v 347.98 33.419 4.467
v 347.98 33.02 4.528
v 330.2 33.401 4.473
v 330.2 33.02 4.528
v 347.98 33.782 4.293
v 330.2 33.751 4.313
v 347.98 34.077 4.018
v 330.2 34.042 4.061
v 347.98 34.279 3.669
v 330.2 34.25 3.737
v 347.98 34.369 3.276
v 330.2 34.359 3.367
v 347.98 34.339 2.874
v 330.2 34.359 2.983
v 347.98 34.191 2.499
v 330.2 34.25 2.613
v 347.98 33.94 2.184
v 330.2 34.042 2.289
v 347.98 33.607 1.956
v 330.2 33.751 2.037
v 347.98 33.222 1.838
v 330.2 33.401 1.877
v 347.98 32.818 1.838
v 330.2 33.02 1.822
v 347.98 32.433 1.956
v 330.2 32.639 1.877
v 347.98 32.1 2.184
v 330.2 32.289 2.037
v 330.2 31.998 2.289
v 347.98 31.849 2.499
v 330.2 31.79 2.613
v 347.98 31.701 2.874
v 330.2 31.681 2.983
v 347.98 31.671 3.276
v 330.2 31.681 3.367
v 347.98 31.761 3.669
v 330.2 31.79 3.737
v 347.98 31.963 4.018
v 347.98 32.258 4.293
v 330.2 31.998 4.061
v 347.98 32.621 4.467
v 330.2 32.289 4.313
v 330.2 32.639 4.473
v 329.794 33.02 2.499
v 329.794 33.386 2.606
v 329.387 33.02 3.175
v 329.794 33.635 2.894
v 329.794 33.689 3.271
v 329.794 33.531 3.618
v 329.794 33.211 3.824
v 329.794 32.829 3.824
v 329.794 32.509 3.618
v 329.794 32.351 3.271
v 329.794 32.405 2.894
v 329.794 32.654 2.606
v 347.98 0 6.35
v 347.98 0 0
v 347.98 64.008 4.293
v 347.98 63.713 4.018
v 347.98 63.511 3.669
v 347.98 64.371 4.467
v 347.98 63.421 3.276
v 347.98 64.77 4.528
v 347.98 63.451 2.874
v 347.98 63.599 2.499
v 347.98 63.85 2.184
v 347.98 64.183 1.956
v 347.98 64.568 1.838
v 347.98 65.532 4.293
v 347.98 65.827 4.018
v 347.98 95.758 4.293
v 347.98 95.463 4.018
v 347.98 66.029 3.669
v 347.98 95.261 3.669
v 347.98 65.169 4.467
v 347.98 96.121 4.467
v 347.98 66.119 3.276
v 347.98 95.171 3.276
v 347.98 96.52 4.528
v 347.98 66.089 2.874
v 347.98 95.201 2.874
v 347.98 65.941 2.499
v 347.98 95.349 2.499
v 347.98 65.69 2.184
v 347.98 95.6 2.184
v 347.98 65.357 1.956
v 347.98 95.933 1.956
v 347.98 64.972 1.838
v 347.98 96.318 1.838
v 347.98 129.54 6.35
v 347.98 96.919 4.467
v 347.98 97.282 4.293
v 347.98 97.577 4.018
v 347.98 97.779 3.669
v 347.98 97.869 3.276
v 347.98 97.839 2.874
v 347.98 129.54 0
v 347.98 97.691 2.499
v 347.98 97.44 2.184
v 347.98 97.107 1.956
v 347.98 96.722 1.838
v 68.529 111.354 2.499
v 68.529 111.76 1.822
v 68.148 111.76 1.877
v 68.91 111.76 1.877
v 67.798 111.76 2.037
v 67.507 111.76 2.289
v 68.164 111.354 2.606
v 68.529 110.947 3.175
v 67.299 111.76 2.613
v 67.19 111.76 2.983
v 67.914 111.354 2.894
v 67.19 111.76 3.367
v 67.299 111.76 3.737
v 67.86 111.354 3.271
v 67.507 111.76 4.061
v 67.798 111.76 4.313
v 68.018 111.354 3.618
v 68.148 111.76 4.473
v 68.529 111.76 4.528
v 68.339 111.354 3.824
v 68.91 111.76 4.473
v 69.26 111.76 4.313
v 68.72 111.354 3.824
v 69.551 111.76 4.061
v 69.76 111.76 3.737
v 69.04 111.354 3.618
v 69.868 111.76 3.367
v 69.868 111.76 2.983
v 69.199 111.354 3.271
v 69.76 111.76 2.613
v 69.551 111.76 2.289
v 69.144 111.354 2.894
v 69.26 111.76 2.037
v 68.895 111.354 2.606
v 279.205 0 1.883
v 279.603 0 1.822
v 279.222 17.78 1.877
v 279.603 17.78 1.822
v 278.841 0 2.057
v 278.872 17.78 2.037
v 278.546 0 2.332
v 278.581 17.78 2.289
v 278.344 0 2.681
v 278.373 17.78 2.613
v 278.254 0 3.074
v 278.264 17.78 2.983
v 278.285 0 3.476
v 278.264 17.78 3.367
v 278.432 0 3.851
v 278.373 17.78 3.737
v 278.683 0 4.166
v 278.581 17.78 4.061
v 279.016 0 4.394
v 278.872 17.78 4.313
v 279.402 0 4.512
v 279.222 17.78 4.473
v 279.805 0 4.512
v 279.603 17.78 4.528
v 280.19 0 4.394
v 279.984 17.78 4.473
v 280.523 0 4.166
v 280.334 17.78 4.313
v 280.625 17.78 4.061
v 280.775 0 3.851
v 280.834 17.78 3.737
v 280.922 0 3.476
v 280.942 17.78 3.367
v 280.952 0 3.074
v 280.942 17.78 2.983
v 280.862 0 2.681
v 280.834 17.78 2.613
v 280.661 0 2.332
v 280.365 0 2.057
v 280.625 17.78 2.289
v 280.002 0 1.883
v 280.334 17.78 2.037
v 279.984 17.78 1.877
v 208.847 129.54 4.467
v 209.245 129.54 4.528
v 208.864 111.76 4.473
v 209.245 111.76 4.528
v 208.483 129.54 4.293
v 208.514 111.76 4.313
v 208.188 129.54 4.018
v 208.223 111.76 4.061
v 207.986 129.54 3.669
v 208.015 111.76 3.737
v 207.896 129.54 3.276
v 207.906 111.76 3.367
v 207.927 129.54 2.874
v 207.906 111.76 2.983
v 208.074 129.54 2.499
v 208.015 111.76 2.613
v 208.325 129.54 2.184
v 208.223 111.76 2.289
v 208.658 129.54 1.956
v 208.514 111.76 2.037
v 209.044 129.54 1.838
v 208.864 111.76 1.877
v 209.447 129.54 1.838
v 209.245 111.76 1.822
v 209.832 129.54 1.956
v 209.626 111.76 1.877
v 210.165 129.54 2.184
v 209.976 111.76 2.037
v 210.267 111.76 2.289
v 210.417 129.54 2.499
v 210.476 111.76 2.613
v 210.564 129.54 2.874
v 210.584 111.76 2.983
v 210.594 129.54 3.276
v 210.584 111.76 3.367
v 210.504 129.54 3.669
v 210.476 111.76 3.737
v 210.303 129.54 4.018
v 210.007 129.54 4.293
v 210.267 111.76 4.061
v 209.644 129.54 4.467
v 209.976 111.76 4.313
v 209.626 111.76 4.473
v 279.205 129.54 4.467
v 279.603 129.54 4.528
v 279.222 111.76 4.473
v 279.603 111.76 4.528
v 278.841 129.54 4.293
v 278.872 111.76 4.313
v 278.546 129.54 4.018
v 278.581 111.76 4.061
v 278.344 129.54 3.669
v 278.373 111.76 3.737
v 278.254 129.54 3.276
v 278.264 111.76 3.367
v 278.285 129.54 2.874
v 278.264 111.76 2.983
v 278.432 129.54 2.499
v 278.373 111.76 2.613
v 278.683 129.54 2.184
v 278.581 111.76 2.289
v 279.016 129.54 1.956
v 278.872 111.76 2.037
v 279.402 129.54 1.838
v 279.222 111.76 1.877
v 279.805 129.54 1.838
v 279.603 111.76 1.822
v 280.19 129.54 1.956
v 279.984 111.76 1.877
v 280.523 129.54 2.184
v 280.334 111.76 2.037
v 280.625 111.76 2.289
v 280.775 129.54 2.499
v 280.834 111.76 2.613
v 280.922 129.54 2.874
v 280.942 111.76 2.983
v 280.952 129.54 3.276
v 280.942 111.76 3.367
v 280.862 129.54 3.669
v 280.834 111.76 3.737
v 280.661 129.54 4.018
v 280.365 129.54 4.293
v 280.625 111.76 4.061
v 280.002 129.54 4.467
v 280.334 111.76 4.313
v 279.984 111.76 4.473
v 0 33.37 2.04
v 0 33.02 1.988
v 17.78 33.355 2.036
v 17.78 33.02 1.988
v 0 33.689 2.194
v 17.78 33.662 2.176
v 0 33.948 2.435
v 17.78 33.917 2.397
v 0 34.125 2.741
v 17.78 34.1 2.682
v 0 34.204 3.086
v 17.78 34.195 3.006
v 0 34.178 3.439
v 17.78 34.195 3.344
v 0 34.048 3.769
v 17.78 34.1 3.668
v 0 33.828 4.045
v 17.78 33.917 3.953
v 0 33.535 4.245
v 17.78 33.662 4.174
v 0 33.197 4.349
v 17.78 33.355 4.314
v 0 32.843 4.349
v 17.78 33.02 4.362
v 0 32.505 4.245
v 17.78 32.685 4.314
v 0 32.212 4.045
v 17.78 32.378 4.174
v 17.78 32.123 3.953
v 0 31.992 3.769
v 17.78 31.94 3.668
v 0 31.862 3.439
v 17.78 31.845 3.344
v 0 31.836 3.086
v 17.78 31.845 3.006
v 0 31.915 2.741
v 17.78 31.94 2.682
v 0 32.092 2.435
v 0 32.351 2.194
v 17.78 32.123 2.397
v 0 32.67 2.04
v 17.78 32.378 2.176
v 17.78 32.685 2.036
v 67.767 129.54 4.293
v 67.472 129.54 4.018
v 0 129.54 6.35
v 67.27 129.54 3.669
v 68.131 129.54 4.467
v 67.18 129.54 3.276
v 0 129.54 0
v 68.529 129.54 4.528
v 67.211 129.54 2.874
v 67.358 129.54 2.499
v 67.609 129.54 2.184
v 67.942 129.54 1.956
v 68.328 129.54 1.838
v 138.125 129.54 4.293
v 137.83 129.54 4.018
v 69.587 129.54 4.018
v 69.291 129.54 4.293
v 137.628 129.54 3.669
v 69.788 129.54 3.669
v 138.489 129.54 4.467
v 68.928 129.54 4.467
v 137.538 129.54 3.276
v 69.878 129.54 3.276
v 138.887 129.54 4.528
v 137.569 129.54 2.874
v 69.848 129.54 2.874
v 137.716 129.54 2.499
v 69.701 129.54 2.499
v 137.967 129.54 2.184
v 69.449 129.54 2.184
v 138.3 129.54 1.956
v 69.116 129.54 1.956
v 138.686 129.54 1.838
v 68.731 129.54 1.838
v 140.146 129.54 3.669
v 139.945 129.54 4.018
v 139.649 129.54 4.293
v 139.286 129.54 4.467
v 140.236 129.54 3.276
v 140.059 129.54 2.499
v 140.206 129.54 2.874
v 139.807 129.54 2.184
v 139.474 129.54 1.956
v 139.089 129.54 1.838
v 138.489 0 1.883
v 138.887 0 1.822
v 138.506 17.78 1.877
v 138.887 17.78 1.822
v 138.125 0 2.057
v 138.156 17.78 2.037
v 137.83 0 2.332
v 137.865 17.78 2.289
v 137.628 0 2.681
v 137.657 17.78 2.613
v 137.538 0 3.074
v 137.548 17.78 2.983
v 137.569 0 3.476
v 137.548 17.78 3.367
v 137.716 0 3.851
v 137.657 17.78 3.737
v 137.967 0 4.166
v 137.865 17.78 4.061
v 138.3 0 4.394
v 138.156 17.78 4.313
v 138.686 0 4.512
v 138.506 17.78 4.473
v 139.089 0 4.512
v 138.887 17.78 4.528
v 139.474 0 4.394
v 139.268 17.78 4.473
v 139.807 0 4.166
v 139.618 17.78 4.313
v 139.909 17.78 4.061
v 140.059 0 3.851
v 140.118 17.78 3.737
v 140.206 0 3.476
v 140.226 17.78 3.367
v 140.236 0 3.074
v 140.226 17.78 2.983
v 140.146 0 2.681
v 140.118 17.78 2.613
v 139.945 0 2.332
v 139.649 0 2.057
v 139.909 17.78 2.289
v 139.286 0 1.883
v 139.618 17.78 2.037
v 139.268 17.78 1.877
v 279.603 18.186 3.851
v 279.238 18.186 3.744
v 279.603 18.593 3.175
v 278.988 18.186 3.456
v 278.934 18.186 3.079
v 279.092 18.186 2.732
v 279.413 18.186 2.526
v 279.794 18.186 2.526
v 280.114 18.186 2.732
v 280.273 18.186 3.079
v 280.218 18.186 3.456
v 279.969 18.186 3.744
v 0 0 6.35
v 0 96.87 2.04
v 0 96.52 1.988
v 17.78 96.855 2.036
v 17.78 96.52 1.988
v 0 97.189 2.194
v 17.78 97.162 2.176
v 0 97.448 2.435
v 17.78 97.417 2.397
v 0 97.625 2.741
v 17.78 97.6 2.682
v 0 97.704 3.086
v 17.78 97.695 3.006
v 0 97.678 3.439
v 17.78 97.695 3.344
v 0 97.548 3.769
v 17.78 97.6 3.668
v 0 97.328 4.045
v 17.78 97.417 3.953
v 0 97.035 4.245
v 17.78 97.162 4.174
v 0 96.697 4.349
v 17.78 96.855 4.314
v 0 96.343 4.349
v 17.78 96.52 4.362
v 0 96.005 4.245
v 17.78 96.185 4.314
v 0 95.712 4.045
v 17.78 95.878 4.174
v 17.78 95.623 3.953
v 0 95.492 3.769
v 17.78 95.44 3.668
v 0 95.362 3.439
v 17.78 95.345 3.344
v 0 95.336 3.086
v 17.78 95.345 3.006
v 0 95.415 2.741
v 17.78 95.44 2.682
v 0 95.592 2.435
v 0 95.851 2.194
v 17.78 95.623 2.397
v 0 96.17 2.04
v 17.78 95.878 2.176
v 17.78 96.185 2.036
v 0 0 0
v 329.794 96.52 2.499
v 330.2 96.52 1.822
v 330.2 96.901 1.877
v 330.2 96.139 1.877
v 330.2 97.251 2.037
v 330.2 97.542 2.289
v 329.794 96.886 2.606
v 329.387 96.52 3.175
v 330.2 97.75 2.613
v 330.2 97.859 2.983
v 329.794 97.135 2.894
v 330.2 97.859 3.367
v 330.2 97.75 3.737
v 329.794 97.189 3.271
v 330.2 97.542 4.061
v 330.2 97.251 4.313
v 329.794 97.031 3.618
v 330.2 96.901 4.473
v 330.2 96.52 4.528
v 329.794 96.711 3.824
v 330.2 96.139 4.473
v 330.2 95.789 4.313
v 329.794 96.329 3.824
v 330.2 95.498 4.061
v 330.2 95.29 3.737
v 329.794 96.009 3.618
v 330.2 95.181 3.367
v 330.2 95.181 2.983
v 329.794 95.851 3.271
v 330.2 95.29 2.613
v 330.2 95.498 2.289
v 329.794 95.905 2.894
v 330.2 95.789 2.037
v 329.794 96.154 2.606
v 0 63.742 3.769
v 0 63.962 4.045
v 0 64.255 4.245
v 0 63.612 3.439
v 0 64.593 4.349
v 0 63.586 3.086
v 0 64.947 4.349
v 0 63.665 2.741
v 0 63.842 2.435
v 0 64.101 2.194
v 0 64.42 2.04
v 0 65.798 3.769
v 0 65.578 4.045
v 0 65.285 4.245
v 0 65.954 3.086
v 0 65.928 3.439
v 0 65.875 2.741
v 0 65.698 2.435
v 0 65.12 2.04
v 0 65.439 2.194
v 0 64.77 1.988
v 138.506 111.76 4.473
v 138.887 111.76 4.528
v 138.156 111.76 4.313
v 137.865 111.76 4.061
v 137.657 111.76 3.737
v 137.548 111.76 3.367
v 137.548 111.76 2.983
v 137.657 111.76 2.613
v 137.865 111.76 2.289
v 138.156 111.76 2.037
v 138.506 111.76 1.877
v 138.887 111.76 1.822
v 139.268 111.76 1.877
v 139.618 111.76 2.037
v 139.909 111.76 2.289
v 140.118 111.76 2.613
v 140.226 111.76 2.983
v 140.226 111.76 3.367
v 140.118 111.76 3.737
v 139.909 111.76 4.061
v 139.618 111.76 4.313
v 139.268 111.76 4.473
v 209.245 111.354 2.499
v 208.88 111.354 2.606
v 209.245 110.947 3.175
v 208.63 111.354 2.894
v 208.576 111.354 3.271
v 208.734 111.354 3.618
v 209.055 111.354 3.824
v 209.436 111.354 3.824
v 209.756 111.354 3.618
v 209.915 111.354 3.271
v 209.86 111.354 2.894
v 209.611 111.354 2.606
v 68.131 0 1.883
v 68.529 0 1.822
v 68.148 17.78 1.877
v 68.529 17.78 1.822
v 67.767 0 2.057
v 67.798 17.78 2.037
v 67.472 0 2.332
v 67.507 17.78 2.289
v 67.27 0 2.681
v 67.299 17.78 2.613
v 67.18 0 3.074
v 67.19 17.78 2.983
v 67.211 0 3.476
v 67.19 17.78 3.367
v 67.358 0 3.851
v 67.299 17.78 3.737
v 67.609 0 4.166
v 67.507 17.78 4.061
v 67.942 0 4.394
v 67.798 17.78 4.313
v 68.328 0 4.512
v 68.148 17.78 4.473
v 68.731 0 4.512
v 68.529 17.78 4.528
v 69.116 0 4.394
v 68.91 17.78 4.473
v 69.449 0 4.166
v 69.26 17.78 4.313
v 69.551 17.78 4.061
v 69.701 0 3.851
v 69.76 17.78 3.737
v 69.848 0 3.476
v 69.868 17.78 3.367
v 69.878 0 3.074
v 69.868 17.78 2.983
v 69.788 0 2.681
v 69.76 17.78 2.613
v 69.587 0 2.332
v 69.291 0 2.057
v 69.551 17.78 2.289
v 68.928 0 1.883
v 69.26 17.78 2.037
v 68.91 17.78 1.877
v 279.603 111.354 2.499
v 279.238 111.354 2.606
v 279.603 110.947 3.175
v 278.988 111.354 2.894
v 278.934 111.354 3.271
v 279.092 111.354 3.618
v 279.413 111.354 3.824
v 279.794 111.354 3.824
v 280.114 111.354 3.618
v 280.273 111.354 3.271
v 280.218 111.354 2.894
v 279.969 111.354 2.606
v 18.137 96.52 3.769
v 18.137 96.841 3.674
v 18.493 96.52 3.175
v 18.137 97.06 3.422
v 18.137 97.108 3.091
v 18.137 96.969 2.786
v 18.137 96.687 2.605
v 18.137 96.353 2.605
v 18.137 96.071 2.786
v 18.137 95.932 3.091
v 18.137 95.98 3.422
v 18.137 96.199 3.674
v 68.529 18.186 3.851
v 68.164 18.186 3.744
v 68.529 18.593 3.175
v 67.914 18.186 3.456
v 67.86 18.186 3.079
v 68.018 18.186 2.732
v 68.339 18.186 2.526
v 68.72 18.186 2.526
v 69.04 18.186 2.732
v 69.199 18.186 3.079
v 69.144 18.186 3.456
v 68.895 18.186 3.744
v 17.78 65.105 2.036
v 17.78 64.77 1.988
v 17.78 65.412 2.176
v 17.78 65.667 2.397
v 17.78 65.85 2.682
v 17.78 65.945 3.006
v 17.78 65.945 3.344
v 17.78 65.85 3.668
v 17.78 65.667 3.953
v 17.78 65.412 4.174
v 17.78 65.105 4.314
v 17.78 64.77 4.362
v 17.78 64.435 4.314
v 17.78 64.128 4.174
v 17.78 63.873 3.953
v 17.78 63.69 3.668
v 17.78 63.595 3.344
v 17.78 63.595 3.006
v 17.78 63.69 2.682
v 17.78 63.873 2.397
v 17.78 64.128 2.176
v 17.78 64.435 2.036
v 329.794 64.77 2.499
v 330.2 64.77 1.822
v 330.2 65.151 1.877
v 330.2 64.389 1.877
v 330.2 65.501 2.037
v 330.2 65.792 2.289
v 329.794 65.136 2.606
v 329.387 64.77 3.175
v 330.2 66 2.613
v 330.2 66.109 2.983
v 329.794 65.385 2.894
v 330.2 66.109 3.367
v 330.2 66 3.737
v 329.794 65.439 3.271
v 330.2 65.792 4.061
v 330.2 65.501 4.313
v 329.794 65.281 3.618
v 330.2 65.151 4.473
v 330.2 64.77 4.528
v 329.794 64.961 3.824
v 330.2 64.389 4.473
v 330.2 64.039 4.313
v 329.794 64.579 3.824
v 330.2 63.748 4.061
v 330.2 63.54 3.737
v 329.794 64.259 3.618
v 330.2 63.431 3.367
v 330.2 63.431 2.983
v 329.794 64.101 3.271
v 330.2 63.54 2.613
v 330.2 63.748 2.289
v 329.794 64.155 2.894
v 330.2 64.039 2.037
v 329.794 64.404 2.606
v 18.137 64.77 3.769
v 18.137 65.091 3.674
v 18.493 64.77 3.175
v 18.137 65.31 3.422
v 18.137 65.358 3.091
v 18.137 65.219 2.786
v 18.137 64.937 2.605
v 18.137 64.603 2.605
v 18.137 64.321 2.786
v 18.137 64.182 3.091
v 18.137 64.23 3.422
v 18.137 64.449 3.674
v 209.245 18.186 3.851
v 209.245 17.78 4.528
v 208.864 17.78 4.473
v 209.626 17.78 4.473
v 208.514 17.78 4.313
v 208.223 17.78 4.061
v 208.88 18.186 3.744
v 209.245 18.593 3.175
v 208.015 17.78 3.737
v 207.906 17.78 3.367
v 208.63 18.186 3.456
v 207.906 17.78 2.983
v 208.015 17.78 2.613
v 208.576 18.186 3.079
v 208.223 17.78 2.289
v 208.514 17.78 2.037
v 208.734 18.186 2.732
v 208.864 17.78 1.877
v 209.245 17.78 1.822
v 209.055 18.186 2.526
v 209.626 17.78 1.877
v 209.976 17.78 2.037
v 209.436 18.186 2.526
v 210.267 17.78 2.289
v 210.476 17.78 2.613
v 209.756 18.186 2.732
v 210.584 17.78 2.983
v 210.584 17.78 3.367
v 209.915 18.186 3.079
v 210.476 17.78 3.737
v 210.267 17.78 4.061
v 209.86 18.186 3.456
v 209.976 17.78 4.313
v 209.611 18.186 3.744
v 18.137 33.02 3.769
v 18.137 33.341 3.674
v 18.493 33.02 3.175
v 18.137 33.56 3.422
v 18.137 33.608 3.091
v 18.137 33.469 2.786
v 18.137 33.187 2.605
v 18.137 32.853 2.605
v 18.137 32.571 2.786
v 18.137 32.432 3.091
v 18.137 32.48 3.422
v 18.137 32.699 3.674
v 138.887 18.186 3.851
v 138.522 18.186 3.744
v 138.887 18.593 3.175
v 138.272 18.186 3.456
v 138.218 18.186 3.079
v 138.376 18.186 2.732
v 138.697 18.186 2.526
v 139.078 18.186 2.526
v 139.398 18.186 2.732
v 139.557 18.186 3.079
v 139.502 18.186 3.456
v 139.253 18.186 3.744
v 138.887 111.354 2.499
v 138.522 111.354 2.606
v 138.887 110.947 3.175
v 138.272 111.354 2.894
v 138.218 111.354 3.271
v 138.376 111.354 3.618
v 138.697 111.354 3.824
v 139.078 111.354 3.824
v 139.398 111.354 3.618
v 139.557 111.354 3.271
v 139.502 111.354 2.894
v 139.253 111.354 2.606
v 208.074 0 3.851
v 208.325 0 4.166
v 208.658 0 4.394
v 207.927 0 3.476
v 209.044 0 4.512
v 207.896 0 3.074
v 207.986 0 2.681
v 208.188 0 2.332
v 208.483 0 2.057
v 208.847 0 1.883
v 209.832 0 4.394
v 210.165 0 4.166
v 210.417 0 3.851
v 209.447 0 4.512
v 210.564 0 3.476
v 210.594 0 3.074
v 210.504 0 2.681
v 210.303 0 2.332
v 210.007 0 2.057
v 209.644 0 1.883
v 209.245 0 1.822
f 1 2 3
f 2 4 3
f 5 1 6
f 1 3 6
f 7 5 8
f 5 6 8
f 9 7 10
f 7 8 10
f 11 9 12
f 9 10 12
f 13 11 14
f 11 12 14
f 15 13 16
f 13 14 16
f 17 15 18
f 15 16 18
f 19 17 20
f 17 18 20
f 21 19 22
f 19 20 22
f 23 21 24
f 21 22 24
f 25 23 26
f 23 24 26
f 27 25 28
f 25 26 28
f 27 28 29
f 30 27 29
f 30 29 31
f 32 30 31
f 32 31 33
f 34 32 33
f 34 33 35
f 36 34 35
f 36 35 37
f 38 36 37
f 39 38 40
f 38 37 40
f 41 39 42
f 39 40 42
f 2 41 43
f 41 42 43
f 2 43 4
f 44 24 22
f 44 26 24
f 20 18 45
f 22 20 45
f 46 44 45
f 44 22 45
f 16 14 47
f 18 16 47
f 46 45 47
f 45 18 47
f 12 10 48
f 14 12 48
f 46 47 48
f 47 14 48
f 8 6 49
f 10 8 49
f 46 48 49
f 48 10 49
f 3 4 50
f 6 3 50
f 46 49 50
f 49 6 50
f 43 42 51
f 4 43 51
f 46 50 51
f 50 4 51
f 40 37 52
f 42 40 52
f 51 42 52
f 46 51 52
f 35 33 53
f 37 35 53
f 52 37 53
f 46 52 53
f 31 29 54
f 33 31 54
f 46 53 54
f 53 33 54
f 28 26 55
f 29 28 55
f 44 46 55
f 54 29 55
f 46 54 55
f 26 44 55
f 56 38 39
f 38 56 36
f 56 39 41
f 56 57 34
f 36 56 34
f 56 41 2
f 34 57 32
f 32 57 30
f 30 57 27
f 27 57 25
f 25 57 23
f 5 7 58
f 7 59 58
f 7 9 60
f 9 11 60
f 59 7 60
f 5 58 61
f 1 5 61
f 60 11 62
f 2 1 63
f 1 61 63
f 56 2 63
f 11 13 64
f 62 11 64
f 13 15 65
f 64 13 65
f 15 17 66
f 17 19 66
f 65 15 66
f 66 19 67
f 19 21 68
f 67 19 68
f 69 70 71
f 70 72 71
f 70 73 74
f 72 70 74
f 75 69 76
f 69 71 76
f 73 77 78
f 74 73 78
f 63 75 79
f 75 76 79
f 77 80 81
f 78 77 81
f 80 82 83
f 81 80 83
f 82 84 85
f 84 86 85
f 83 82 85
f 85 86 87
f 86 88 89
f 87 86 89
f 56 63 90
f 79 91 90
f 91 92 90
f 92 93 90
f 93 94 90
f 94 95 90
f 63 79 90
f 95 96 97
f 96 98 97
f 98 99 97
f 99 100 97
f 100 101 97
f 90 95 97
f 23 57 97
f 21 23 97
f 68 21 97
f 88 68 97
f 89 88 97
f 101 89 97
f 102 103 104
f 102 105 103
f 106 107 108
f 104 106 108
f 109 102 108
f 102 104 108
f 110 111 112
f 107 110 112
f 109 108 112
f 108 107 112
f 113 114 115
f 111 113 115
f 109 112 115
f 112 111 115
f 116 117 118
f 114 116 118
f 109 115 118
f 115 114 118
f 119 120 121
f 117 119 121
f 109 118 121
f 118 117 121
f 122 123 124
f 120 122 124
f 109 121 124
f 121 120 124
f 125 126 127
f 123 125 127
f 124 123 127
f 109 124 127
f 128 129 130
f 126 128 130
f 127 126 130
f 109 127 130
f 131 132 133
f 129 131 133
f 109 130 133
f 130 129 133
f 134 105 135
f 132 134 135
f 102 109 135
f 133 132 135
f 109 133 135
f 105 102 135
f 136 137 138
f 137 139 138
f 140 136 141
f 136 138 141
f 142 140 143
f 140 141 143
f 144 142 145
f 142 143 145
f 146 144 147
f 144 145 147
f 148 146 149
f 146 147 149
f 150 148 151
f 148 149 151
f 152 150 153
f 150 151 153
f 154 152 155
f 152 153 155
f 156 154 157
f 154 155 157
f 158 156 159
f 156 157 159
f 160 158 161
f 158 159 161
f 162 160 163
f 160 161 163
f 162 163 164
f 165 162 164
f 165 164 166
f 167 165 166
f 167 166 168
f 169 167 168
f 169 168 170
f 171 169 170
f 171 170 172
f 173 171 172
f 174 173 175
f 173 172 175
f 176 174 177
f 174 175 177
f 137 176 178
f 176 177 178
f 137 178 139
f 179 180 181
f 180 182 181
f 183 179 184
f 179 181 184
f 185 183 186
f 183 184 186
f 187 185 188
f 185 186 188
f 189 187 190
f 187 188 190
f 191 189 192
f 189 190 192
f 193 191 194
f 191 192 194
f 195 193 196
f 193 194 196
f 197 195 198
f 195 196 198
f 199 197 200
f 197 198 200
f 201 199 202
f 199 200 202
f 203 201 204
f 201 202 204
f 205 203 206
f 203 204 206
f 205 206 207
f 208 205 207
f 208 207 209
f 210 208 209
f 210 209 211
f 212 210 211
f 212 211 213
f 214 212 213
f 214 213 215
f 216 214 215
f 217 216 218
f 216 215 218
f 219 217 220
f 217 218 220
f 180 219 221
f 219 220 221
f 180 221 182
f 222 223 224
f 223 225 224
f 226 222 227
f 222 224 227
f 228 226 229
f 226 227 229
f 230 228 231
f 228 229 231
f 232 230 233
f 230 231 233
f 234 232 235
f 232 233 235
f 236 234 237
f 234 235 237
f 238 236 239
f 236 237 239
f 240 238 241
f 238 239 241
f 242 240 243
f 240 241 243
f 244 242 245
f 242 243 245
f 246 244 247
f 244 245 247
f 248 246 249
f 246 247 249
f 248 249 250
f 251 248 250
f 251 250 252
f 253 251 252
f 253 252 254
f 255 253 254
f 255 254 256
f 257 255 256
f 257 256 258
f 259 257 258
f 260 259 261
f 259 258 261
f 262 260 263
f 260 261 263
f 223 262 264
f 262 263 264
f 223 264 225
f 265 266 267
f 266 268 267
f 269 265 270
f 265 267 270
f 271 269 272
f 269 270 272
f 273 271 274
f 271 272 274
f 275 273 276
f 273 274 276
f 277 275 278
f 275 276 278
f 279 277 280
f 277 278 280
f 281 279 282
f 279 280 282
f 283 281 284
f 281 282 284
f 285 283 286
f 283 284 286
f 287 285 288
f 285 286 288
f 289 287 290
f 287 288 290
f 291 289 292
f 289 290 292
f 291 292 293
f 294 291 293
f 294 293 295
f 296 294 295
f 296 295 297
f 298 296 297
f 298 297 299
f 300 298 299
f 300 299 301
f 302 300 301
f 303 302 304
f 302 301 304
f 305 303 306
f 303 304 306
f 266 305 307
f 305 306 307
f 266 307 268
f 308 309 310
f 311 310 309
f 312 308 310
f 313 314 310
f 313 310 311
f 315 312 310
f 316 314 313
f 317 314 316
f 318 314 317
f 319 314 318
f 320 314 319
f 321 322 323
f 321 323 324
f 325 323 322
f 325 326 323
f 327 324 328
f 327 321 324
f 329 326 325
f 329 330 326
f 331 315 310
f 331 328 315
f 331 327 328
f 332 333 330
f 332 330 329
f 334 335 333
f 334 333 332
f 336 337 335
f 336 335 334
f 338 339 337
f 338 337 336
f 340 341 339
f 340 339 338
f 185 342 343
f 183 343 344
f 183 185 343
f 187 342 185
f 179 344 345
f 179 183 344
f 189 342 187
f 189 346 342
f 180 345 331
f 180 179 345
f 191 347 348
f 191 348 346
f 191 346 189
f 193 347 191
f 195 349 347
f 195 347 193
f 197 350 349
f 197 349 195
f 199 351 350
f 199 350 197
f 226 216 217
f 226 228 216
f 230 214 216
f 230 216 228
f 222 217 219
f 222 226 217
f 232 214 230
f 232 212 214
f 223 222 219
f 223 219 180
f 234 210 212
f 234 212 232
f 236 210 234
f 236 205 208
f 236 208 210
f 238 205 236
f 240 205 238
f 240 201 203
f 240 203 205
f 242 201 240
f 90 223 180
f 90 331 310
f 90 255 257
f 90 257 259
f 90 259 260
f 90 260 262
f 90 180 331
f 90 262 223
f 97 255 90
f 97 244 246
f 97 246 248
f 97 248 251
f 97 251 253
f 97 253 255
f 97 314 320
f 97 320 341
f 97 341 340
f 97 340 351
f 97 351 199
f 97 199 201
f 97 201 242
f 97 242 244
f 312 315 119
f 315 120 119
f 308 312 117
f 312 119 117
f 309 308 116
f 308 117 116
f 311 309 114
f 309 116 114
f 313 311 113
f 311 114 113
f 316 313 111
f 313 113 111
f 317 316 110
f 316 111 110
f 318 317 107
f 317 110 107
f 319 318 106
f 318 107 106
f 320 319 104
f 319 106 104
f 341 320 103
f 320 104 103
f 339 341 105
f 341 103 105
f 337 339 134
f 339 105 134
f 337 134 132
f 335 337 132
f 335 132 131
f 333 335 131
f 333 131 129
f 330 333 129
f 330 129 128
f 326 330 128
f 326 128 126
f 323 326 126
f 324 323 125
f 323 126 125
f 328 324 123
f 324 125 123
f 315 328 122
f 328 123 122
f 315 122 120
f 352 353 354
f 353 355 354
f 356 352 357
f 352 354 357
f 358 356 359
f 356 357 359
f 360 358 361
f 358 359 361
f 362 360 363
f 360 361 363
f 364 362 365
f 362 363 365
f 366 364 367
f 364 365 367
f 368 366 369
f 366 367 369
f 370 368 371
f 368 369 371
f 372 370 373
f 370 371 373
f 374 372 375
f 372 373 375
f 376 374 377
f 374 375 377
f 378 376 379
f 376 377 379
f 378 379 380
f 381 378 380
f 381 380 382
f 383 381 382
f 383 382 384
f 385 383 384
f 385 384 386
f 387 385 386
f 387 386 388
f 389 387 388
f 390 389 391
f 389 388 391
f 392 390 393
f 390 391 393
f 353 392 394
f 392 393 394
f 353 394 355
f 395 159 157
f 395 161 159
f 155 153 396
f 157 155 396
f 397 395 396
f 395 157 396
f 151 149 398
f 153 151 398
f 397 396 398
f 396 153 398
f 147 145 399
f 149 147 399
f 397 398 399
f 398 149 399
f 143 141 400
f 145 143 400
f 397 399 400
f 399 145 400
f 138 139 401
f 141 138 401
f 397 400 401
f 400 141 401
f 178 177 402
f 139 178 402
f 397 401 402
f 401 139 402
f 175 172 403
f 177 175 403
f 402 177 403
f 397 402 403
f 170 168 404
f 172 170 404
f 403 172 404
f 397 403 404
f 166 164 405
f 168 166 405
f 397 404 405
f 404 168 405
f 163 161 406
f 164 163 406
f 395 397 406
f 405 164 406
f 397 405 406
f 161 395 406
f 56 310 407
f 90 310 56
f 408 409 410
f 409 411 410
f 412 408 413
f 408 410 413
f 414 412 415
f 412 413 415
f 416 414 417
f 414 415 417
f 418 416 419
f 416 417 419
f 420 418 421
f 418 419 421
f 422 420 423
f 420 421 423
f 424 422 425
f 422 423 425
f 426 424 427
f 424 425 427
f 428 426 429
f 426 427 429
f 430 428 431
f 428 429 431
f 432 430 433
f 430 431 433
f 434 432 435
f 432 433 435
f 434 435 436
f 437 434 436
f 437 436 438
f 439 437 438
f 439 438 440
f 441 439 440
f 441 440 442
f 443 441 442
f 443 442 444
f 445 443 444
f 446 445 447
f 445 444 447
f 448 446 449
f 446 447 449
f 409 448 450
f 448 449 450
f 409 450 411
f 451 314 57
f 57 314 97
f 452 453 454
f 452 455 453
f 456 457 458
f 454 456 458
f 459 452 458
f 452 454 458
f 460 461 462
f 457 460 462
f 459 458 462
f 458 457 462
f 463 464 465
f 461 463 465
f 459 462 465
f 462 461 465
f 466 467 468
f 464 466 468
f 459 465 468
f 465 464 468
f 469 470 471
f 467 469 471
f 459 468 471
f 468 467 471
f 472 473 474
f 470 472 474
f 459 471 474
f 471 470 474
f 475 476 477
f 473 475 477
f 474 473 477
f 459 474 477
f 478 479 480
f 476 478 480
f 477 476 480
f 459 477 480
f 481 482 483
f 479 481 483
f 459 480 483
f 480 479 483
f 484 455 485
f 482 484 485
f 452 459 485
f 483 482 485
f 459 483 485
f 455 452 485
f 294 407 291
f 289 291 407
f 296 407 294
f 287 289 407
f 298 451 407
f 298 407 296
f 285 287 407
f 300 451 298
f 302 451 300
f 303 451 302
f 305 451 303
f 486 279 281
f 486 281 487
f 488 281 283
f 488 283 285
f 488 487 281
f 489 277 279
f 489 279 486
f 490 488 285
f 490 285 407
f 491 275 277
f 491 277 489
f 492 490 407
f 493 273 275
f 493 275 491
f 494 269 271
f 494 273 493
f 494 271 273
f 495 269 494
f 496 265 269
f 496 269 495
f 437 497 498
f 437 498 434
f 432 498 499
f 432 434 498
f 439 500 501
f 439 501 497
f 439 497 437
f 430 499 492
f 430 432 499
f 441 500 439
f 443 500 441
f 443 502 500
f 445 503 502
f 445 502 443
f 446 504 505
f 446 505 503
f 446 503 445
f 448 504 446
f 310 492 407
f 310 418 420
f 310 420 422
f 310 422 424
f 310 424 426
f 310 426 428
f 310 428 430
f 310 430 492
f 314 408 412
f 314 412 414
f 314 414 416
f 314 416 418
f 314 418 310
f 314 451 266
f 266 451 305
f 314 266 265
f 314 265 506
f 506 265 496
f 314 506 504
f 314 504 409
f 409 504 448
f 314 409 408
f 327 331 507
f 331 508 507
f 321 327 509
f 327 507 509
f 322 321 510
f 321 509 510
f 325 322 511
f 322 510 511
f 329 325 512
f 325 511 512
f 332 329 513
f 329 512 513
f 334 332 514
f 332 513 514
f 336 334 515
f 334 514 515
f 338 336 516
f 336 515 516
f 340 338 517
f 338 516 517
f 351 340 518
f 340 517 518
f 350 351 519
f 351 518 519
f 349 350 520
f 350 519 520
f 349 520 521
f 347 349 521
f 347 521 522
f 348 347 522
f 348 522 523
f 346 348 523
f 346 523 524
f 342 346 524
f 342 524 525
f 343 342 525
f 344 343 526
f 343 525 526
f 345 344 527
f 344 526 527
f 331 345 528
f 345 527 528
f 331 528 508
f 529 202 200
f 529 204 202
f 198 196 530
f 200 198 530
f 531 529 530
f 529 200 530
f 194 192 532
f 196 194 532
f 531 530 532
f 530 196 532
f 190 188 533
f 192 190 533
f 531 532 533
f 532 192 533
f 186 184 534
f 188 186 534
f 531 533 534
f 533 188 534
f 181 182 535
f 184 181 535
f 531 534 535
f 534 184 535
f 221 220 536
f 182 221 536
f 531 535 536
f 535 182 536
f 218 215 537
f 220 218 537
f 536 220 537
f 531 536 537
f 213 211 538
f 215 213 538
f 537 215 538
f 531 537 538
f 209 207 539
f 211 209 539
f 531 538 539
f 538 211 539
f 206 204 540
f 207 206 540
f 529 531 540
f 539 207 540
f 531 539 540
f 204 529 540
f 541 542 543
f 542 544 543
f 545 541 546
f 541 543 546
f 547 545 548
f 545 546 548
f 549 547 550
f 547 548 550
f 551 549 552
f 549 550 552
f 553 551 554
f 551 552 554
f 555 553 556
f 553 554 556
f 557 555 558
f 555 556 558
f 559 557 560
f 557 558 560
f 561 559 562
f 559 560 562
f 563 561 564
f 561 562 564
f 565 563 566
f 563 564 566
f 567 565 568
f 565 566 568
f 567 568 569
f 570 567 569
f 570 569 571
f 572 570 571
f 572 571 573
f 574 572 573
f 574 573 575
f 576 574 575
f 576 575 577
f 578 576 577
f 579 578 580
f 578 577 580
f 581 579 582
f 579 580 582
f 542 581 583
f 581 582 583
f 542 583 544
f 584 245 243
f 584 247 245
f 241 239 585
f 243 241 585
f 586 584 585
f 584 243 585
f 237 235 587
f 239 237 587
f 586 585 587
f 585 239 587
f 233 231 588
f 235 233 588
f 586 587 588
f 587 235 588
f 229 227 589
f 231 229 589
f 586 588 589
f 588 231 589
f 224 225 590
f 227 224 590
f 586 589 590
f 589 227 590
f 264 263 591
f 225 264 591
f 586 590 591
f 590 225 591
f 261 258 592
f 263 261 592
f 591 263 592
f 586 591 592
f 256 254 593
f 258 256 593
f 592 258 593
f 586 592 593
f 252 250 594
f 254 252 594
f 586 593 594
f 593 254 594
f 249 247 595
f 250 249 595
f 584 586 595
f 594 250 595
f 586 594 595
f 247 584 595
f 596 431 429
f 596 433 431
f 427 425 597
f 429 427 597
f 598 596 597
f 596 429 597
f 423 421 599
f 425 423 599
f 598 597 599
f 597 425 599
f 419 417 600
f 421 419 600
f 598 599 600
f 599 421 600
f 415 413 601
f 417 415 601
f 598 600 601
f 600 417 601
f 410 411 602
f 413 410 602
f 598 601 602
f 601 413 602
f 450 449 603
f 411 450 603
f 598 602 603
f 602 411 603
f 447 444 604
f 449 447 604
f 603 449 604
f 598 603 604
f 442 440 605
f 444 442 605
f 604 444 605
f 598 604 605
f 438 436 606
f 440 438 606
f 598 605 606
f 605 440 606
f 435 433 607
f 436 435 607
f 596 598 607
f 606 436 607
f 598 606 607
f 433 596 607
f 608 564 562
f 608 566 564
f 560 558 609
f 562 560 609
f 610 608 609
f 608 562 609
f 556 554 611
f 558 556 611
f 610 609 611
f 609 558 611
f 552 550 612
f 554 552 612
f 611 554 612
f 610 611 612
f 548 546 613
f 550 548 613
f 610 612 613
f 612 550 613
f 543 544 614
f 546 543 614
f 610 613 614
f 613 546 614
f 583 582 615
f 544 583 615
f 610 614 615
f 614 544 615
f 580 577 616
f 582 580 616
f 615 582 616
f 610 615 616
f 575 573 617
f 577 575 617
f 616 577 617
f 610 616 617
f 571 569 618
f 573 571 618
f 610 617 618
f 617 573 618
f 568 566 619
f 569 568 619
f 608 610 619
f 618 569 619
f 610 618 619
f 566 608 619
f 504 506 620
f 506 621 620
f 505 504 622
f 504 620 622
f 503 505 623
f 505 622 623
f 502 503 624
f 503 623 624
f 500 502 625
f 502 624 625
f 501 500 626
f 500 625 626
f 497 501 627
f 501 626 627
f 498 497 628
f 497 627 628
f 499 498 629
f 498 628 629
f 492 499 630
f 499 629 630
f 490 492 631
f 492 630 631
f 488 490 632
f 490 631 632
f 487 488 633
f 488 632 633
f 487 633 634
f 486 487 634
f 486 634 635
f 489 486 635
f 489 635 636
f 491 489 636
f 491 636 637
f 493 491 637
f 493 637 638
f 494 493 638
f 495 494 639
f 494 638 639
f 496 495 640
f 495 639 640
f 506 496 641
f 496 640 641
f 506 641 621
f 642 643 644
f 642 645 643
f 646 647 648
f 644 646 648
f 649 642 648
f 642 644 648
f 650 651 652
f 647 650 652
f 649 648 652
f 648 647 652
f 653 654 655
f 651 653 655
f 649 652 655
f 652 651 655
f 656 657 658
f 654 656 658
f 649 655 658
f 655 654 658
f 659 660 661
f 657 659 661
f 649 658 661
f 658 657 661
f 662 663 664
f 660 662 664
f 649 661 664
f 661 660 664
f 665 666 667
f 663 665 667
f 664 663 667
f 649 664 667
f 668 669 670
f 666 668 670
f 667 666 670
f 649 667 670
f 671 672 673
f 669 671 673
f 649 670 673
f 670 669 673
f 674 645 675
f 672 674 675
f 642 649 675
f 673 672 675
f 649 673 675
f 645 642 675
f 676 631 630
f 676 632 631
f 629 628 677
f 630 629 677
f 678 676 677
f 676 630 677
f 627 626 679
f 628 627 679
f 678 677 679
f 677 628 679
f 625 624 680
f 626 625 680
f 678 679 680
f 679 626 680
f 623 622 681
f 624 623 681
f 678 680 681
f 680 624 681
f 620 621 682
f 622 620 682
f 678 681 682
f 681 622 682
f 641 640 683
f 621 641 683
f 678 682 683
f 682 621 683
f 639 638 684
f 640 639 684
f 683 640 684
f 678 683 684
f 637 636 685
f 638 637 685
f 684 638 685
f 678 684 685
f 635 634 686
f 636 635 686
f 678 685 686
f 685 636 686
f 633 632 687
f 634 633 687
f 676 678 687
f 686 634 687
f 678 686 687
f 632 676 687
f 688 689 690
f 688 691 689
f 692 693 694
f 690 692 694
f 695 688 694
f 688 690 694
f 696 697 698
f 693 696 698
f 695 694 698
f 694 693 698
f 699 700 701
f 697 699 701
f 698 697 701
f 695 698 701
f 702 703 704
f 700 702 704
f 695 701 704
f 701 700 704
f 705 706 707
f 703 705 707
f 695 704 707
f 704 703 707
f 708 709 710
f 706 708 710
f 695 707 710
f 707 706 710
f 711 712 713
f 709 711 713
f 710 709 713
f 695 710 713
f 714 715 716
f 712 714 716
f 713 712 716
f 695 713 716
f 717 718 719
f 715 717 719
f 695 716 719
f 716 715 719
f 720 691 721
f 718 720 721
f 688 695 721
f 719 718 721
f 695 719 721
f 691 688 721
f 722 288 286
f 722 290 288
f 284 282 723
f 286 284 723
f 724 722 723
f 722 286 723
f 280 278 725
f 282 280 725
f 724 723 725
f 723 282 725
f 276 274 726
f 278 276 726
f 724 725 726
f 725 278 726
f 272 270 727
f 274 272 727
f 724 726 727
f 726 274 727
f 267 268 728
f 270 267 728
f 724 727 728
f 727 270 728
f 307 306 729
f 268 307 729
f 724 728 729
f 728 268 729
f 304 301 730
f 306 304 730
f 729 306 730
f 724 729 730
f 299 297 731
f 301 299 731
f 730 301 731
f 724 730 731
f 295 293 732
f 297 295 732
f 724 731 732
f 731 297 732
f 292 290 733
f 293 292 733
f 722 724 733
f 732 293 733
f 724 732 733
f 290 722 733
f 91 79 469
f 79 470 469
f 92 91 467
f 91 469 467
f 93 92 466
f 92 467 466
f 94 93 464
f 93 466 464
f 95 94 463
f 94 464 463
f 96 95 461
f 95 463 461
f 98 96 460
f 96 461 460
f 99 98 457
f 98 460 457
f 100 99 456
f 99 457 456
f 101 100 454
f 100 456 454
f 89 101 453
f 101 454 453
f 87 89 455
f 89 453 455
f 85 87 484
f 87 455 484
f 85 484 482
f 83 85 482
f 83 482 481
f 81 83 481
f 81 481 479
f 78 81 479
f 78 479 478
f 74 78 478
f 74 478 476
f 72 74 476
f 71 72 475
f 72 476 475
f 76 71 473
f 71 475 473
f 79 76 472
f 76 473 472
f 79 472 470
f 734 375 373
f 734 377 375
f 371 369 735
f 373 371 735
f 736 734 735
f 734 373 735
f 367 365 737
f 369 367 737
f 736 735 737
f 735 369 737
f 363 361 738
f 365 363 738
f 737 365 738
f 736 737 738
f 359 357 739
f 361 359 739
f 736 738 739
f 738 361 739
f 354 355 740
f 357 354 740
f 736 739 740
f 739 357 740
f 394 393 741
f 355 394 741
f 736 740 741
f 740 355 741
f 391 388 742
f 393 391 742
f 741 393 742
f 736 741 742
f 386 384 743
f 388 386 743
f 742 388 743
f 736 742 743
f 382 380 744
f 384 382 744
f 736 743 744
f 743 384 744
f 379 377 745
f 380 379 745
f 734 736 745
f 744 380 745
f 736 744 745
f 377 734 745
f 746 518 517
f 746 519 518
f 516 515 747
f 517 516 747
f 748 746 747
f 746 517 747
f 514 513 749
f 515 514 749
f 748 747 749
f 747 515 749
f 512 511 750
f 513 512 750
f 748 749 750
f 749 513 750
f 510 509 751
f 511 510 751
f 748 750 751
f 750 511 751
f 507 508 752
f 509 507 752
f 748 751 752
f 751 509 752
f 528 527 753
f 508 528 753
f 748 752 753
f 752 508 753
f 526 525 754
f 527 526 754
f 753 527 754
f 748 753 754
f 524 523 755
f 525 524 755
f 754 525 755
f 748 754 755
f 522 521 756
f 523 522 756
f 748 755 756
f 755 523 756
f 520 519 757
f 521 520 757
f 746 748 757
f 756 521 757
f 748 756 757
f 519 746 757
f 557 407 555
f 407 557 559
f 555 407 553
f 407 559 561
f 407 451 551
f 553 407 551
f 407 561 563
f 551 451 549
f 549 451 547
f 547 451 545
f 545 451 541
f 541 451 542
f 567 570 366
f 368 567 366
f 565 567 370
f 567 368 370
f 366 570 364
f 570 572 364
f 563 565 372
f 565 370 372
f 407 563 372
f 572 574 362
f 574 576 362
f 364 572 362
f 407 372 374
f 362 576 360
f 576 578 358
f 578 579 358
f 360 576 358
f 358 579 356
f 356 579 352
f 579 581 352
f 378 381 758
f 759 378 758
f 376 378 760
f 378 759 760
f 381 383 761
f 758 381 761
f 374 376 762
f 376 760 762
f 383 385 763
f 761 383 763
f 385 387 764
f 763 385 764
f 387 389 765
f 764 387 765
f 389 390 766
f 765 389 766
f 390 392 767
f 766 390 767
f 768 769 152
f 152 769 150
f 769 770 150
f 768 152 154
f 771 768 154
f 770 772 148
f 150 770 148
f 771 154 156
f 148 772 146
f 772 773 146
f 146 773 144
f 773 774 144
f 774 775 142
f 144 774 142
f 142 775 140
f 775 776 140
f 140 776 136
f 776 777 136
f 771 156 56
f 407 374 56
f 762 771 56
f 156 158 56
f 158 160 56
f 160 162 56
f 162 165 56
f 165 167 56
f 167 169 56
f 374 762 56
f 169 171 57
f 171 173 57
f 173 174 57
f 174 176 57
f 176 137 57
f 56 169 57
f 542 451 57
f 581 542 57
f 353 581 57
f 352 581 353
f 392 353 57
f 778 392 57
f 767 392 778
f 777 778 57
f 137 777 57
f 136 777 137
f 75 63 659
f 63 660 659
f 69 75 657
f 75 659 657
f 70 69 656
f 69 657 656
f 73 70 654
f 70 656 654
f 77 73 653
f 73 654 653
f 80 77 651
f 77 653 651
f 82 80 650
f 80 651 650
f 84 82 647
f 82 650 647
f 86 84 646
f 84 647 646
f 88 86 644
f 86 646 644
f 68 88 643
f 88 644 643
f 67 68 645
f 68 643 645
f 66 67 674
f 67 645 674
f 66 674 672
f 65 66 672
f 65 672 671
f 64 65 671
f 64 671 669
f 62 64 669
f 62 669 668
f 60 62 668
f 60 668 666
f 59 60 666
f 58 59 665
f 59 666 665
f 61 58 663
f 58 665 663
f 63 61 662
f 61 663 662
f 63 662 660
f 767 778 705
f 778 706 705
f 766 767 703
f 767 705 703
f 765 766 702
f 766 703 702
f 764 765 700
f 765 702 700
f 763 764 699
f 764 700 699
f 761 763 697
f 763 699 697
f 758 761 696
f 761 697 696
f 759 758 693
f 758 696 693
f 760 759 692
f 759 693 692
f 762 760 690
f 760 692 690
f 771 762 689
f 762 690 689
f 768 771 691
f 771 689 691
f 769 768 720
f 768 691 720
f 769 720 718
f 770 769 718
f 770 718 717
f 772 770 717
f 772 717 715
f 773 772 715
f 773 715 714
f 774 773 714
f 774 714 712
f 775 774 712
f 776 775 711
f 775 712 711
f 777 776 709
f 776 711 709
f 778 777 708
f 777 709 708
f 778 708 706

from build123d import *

# Parameters (mm, degrees)
SKETCH1_W                       = 347.98
SKETCH1_H                       = 129.54
BOSS_EXTRUDE1_DEPTH             = 6.35
F_34_0_111_DIAMETER_HOLE4_D     = 2.3749
F_34_0_111_DIAMETER_HOLE4_DEPTH = 17.78
F_34_0_111_DIAMETER_HOLE4_TIP   = 0.713491942
TAP_DRILL_FOR_6_32_TAP1_D       = 2.7051
TAP_DRILL_FOR_6_32_TAP1_DEPTH   = 17.78
TAP_DRILL_FOR_6_32_TAP1_TIP     = 0.81269403
TAP_DRILL_FOR_6_32_TAP2_D       = 2.7051
TAP_DRILL_FOR_6_32_TAP2_DEPTH   = 17.78
TAP_DRILL_FOR_6_32_TAP2_TIP     = 0.81269403
TAP_DRILL_FOR_6_32_TAP3_D       = 2.7051
TAP_DRILL_FOR_6_32_TAP3_DEPTH   = 17.78
TAP_DRILL_FOR_6_32_TAP3_TIP     = 0.81269403


with BuildPart() as part:
    # Sketch1 → Boss-Extrude1 (new body)
    with BuildSketch(Plane.XY):
        with Locations((173.99, 64.77)):
            Rectangle(SKETCH1_W, SKETCH1_H)
    extrude(amount=BOSS_EXTRUDE1_DEPTH)

    # #34 (0.111) Diameter Hole4
    with Locations(Plane(origin=(0, 13.303154199, -243.112488364), x_dir=(0, 0, 1), z_dir=(-1, 0, 0))):
        with Locations((-105.502511636, 81.946845801), (-105.502511636, 56.546845801), (-105.502511636, 31.146845801), (246.287488364, 83.216845801), (246.287488364, 51.466845801), (246.287488364, 19.716845801)):
            Hole(F_34_0_111_DIAMETER_HOLE4_D / 2, depth=F_34_0_111_DIAMETER_HOLE4_DEPTH)
            with Locations((0, 0, -(F_34_0_111_DIAMETER_HOLE4_DEPTH + F_34_0_111_DIAMETER_HOLE4_TIP / 2))):  # 118° drill point
                Cone(0, F_34_0_111_DIAMETER_HOLE4_D / 2, F_34_0_111_DIAMETER_HOLE4_TIP, mode=Mode.SUBTRACT)

    # Tap Drill for #6-32 Tap1
    with Locations(Plane(origin=(-62.772488364, 129.54, -82.602448836), x_dir=(0, 0, -1), z_dir=(0, 1, 0))):
        with Locations((-85.777448836, -342.375688364), (-85.777448836, -272.017688364), (-85.777448836, -201.659688364), (-85.777448836, -131.301688364)):
            Hole(TAP_DRILL_FOR_6_32_TAP1_D / 2, depth=TAP_DRILL_FOR_6_32_TAP1_DEPTH)
            with Locations((0, 0, -(TAP_DRILL_FOR_6_32_TAP1_DEPTH + TAP_DRILL_FOR_6_32_TAP1_TIP / 2))):  # 118° drill point
                Cone(0, TAP_DRILL_FOR_6_32_TAP1_D / 2, TAP_DRILL_FOR_6_32_TAP1_TIP, mode=Mode.SUBTRACT)

    # Tap Drill for #6-32 Tap2
    with Locations(Plane(origin=(-62.772488364, 0, -82.602448836), x_dir=(0, 0, 1), z_dir=(0, -1, 0))):
        with Locations((85.777448836, -131.301688364), (85.777448836, -201.659688364), (85.777448836, -272.017688364), (85.777448836, -342.375688364)):
            Hole(TAP_DRILL_FOR_6_32_TAP2_D / 2, depth=TAP_DRILL_FOR_6_32_TAP2_DEPTH)
            with Locations((0, 0, -(TAP_DRILL_FOR_6_32_TAP2_DEPTH + TAP_DRILL_FOR_6_32_TAP2_TIP / 2))):  # 118° drill point
                Cone(0, TAP_DRILL_FOR_6_32_TAP2_D / 2, TAP_DRILL_FOR_6_32_TAP2_TIP, mode=Mode.SUBTRACT)

    # Tap Drill for #6-32 Tap3
    with Locations(Plane(origin=(347.98, 0, 0), x_dir=(0, 0, -1), z_dir=(1, 0, 0))):
        with Locations((-3.175, 64.77), (-3.175, 96.52), (-3.175, 33.02)):
            Hole(TAP_DRILL_FOR_6_32_TAP3_D / 2, depth=TAP_DRILL_FOR_6_32_TAP3_DEPTH)
            with Locations((0, 0, -(TAP_DRILL_FOR_6_32_TAP3_DEPTH + TAP_DRILL_FOR_6_32_TAP3_TIP / 2))):  # 118° drill point
                Cone(0, TAP_DRILL_FOR_6_32_TAP3_D / 2, TAP_DRILL_FOR_6_32_TAP3_TIP, mode=Mode.SUBTRACT)


solid = part.part
